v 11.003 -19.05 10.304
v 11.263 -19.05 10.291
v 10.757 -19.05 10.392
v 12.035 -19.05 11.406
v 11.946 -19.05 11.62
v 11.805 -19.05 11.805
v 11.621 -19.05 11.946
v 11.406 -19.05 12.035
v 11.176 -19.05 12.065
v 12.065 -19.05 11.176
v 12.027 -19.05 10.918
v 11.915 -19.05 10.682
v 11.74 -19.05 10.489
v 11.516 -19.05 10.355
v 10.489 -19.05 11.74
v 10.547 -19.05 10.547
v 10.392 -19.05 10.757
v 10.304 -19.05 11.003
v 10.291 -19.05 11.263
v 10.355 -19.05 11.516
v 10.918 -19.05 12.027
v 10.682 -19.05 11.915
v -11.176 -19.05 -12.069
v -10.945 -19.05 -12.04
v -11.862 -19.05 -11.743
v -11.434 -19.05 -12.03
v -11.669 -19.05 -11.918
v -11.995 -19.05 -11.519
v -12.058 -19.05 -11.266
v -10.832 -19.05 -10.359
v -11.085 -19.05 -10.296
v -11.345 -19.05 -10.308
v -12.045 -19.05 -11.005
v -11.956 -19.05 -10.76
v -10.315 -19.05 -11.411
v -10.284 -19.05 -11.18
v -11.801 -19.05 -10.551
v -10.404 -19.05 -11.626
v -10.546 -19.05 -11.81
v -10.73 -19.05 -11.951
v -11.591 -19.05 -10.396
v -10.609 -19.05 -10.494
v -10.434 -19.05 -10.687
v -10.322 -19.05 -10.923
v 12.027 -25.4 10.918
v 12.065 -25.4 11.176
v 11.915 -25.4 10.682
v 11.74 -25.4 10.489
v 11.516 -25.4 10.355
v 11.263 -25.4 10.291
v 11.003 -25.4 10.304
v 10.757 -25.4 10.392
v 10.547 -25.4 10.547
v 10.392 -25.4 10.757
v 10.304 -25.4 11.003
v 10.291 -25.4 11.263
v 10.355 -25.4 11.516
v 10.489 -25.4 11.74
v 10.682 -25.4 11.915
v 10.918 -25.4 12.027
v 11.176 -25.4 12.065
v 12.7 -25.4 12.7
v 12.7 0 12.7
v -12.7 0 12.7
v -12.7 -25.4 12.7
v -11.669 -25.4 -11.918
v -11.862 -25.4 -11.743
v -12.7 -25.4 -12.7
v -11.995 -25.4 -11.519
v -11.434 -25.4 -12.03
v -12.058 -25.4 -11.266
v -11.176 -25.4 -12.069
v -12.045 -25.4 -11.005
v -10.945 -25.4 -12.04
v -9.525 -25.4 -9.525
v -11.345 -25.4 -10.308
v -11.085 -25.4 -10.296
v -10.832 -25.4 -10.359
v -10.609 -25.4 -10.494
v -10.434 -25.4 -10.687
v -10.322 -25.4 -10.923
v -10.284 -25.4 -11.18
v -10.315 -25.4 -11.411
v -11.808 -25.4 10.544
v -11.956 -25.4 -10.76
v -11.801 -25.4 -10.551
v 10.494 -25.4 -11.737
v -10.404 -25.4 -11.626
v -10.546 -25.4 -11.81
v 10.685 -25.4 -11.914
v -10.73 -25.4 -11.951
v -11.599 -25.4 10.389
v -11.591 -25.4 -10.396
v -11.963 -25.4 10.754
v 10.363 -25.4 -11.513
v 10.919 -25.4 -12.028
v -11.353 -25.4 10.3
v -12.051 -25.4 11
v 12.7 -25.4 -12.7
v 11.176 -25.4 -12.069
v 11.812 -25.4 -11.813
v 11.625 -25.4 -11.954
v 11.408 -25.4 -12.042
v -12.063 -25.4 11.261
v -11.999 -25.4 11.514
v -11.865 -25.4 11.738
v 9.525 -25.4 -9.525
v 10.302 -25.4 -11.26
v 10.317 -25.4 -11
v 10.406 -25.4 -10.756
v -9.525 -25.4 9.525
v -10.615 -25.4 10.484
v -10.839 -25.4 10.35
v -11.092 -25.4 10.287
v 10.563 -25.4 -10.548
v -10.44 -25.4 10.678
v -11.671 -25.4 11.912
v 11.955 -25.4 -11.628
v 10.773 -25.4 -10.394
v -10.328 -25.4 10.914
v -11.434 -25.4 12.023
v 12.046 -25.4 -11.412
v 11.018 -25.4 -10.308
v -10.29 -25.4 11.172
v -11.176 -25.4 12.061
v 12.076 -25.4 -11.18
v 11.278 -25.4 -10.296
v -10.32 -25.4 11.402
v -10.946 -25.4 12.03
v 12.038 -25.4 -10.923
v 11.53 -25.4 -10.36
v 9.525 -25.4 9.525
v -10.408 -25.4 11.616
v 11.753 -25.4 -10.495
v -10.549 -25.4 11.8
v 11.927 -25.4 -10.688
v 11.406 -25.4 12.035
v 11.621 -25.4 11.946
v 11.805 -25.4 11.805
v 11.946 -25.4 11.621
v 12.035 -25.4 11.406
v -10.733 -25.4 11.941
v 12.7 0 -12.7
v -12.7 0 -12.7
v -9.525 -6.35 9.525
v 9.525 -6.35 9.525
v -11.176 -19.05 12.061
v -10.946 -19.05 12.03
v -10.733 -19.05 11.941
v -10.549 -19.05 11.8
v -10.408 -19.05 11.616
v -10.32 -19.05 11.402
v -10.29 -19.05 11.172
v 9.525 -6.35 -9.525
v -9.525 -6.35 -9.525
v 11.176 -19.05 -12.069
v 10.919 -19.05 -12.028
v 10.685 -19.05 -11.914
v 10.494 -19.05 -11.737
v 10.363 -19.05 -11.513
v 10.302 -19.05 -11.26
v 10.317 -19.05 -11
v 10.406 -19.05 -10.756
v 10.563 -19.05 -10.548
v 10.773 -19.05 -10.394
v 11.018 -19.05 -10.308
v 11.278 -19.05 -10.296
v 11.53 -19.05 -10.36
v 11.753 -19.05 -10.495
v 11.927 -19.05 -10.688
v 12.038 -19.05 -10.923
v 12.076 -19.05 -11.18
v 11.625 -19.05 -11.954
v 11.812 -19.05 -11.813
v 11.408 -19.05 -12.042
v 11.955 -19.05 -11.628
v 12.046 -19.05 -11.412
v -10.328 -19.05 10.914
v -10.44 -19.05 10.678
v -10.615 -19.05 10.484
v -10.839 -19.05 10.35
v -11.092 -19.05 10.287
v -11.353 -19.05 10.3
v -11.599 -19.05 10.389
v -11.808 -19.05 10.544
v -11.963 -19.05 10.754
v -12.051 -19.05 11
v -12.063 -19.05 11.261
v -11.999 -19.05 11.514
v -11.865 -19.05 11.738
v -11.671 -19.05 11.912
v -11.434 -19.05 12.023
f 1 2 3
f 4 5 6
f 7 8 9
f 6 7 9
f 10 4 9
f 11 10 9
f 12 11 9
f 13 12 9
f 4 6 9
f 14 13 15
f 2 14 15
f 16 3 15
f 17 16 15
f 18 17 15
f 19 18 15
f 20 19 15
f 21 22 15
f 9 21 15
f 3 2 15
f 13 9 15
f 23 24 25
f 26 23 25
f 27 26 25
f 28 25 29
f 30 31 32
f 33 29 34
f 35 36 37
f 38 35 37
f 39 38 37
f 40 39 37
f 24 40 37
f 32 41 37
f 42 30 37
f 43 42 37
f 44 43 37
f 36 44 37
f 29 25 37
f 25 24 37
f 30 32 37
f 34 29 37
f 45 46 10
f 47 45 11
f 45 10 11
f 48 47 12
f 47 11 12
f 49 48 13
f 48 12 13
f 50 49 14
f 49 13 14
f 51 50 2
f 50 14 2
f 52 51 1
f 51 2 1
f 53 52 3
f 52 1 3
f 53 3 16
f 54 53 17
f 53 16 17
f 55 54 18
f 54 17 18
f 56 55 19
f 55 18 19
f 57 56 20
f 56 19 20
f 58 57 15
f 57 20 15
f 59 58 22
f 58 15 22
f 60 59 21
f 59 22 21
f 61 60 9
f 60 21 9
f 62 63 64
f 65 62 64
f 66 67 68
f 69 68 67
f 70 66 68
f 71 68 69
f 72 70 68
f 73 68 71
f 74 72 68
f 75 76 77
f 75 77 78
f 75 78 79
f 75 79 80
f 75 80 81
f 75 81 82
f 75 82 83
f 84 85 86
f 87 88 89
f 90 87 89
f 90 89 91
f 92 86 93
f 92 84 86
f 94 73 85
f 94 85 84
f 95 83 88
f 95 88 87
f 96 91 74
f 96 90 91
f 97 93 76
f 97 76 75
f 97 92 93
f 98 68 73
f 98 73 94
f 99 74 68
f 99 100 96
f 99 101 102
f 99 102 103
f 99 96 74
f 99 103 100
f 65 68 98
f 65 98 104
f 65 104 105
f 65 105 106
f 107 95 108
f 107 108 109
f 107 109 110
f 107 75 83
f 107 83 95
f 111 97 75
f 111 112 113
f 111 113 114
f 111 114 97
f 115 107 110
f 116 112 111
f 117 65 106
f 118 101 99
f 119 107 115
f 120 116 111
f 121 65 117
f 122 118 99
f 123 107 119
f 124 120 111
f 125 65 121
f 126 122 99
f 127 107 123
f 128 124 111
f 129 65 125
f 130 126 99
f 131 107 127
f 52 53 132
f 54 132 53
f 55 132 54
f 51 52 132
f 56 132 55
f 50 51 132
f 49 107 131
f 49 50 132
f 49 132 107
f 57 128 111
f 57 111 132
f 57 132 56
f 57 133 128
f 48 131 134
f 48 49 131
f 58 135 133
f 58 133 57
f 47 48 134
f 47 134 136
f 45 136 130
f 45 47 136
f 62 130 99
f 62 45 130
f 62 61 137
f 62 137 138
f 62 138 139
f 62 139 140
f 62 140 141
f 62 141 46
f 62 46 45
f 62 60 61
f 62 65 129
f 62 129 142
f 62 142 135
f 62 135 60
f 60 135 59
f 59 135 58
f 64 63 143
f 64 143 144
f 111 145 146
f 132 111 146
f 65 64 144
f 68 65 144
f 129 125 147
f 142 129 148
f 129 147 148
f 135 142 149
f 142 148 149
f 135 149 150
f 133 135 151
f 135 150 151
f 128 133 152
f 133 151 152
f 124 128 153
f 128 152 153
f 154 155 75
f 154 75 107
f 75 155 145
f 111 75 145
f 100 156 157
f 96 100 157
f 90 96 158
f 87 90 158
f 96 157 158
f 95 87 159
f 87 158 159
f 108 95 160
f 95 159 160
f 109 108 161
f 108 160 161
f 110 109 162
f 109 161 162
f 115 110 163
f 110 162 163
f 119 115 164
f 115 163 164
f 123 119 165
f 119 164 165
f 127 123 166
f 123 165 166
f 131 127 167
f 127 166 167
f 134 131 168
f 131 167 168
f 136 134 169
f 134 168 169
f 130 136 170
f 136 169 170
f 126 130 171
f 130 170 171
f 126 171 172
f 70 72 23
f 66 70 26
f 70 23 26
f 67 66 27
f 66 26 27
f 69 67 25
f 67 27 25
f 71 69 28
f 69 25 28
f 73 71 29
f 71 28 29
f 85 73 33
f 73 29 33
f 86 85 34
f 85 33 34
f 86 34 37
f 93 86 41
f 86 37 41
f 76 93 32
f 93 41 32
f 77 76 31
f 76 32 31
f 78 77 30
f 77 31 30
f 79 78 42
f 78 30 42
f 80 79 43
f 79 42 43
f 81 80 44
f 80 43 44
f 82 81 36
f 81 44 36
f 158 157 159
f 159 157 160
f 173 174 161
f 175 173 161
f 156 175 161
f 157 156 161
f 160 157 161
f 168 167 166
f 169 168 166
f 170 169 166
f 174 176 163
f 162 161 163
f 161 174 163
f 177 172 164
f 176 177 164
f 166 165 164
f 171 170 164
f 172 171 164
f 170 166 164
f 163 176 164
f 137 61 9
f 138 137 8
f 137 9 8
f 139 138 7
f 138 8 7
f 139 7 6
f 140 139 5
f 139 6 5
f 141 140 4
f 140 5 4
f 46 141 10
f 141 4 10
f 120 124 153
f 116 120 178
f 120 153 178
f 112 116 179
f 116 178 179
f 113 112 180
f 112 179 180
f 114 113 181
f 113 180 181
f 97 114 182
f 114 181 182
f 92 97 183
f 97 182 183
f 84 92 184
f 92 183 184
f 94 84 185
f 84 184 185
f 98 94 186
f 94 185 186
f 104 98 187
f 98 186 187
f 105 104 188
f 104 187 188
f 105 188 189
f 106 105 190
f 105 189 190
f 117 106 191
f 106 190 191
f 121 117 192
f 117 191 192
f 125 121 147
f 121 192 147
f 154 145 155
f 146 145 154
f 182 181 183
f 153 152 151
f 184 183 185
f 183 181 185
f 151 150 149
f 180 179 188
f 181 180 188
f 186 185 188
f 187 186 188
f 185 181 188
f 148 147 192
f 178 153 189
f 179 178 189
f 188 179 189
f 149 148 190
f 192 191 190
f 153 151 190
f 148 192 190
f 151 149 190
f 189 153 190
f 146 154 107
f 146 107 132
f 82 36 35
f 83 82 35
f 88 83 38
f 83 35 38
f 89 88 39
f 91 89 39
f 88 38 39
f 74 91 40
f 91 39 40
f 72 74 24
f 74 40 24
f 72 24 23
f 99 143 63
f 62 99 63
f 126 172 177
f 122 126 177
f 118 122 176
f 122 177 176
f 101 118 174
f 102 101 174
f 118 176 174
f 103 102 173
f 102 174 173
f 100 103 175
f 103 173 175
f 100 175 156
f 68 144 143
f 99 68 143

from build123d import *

# Parameters (mm, degrees)
F0_W     = 19.05
F0_H     = 19.05
F1_DEPTH = 25.4
F2_W     = 19.05
F2_H     = 19.05
F3_DEPTH = 6.35
F4_R     = 0.889
F5_DEPTH = 19.05


with BuildPart() as f1:
    # F0 (on Front) → F1 (new body)
    with BuildSketch(Plane.XZ):
        Polygon((12.7, -12.7), (12.7, 12.7), (11.176, 12.7), (-11.176, 12.7), (-12.7, 12.7), (-12.7, -12.7), (-11.176, -12.7), (11.176, -12.7), align=None)
        with BuildLine():
            ThreePointArc((-10.284095511, -11.1804986587), (-10.5455053146, -11.8101426417), (-11.176, -12.069493914))
            ThreePointArc((-11.176, -12.069493914), (-11.8006857075, -10.5508546757), (-10.284095511, -11.1804986587))
        make_face(mode=Mode.SUBTRACT)
        Rectangle(F0_W, F0_H, mode=Mode.SUBTRACT)
        with BuildLine():
            ThreePointArc((12.0763947175, -11.1804986587), (11.8119710123, -11.813132401), (11.176, -12.0694256301))
            ThreePointArc((11.176, -12.0694256301), (10.5628184227, -10.5478649164), (12.0763947175, -11.1804986587))
        make_face(mode=Mode.SUBTRACT)
        with BuildLine():
            ThreePointArc((-10.2897327763, 11.1719880705), (-11.8083161457, 10.5443370679), (-11.176, 12.0609838702))
            ThreePointArc((-11.176, 12.0609838702), (-10.5491494068, 11.799639073), (-10.2897327763, 11.1719880705))
        make_face(mode=Mode.SUBTRACT)
        with BuildLine():
            ThreePointArc((12.065, 11.176), (10.5473820715, 10.5473820715), (11.176, 12.065))
            ThreePointArc((11.176, 12.065), (11.8046179285, 11.8046179285), (12.065, 11.176))
        make_face(mode=Mode.SUBTRACT)
    extrude(amount=F1_DEPTH)

    # F2 (on Front) → F3 (join)
    with BuildSketch(Plane.XZ):
        Rectangle(F2_W, F2_H)
    extrude(amount=F3_DEPTH)

    # F4 (on face) → F5 (join)
    with BuildSketch(Plane(origin=(0, 0, 0), x_dir=(-1, 0, 0), z_dir=(0, 1, 0))):
        with Locations((11.1787327763, 11.1719880705)):
            Circle(F4_R)
        with Locations((-11.1873947175, -11.1804986587)):
            Circle(F4_R)
        with Locations((11.173095511, -11.1804986587)):
            Circle(F4_R)
        with Locations((-11.176, 11.176)):
            Circle(F4_R)
    extrude(amount=-F5_DEPTH)


solid = f1.part
